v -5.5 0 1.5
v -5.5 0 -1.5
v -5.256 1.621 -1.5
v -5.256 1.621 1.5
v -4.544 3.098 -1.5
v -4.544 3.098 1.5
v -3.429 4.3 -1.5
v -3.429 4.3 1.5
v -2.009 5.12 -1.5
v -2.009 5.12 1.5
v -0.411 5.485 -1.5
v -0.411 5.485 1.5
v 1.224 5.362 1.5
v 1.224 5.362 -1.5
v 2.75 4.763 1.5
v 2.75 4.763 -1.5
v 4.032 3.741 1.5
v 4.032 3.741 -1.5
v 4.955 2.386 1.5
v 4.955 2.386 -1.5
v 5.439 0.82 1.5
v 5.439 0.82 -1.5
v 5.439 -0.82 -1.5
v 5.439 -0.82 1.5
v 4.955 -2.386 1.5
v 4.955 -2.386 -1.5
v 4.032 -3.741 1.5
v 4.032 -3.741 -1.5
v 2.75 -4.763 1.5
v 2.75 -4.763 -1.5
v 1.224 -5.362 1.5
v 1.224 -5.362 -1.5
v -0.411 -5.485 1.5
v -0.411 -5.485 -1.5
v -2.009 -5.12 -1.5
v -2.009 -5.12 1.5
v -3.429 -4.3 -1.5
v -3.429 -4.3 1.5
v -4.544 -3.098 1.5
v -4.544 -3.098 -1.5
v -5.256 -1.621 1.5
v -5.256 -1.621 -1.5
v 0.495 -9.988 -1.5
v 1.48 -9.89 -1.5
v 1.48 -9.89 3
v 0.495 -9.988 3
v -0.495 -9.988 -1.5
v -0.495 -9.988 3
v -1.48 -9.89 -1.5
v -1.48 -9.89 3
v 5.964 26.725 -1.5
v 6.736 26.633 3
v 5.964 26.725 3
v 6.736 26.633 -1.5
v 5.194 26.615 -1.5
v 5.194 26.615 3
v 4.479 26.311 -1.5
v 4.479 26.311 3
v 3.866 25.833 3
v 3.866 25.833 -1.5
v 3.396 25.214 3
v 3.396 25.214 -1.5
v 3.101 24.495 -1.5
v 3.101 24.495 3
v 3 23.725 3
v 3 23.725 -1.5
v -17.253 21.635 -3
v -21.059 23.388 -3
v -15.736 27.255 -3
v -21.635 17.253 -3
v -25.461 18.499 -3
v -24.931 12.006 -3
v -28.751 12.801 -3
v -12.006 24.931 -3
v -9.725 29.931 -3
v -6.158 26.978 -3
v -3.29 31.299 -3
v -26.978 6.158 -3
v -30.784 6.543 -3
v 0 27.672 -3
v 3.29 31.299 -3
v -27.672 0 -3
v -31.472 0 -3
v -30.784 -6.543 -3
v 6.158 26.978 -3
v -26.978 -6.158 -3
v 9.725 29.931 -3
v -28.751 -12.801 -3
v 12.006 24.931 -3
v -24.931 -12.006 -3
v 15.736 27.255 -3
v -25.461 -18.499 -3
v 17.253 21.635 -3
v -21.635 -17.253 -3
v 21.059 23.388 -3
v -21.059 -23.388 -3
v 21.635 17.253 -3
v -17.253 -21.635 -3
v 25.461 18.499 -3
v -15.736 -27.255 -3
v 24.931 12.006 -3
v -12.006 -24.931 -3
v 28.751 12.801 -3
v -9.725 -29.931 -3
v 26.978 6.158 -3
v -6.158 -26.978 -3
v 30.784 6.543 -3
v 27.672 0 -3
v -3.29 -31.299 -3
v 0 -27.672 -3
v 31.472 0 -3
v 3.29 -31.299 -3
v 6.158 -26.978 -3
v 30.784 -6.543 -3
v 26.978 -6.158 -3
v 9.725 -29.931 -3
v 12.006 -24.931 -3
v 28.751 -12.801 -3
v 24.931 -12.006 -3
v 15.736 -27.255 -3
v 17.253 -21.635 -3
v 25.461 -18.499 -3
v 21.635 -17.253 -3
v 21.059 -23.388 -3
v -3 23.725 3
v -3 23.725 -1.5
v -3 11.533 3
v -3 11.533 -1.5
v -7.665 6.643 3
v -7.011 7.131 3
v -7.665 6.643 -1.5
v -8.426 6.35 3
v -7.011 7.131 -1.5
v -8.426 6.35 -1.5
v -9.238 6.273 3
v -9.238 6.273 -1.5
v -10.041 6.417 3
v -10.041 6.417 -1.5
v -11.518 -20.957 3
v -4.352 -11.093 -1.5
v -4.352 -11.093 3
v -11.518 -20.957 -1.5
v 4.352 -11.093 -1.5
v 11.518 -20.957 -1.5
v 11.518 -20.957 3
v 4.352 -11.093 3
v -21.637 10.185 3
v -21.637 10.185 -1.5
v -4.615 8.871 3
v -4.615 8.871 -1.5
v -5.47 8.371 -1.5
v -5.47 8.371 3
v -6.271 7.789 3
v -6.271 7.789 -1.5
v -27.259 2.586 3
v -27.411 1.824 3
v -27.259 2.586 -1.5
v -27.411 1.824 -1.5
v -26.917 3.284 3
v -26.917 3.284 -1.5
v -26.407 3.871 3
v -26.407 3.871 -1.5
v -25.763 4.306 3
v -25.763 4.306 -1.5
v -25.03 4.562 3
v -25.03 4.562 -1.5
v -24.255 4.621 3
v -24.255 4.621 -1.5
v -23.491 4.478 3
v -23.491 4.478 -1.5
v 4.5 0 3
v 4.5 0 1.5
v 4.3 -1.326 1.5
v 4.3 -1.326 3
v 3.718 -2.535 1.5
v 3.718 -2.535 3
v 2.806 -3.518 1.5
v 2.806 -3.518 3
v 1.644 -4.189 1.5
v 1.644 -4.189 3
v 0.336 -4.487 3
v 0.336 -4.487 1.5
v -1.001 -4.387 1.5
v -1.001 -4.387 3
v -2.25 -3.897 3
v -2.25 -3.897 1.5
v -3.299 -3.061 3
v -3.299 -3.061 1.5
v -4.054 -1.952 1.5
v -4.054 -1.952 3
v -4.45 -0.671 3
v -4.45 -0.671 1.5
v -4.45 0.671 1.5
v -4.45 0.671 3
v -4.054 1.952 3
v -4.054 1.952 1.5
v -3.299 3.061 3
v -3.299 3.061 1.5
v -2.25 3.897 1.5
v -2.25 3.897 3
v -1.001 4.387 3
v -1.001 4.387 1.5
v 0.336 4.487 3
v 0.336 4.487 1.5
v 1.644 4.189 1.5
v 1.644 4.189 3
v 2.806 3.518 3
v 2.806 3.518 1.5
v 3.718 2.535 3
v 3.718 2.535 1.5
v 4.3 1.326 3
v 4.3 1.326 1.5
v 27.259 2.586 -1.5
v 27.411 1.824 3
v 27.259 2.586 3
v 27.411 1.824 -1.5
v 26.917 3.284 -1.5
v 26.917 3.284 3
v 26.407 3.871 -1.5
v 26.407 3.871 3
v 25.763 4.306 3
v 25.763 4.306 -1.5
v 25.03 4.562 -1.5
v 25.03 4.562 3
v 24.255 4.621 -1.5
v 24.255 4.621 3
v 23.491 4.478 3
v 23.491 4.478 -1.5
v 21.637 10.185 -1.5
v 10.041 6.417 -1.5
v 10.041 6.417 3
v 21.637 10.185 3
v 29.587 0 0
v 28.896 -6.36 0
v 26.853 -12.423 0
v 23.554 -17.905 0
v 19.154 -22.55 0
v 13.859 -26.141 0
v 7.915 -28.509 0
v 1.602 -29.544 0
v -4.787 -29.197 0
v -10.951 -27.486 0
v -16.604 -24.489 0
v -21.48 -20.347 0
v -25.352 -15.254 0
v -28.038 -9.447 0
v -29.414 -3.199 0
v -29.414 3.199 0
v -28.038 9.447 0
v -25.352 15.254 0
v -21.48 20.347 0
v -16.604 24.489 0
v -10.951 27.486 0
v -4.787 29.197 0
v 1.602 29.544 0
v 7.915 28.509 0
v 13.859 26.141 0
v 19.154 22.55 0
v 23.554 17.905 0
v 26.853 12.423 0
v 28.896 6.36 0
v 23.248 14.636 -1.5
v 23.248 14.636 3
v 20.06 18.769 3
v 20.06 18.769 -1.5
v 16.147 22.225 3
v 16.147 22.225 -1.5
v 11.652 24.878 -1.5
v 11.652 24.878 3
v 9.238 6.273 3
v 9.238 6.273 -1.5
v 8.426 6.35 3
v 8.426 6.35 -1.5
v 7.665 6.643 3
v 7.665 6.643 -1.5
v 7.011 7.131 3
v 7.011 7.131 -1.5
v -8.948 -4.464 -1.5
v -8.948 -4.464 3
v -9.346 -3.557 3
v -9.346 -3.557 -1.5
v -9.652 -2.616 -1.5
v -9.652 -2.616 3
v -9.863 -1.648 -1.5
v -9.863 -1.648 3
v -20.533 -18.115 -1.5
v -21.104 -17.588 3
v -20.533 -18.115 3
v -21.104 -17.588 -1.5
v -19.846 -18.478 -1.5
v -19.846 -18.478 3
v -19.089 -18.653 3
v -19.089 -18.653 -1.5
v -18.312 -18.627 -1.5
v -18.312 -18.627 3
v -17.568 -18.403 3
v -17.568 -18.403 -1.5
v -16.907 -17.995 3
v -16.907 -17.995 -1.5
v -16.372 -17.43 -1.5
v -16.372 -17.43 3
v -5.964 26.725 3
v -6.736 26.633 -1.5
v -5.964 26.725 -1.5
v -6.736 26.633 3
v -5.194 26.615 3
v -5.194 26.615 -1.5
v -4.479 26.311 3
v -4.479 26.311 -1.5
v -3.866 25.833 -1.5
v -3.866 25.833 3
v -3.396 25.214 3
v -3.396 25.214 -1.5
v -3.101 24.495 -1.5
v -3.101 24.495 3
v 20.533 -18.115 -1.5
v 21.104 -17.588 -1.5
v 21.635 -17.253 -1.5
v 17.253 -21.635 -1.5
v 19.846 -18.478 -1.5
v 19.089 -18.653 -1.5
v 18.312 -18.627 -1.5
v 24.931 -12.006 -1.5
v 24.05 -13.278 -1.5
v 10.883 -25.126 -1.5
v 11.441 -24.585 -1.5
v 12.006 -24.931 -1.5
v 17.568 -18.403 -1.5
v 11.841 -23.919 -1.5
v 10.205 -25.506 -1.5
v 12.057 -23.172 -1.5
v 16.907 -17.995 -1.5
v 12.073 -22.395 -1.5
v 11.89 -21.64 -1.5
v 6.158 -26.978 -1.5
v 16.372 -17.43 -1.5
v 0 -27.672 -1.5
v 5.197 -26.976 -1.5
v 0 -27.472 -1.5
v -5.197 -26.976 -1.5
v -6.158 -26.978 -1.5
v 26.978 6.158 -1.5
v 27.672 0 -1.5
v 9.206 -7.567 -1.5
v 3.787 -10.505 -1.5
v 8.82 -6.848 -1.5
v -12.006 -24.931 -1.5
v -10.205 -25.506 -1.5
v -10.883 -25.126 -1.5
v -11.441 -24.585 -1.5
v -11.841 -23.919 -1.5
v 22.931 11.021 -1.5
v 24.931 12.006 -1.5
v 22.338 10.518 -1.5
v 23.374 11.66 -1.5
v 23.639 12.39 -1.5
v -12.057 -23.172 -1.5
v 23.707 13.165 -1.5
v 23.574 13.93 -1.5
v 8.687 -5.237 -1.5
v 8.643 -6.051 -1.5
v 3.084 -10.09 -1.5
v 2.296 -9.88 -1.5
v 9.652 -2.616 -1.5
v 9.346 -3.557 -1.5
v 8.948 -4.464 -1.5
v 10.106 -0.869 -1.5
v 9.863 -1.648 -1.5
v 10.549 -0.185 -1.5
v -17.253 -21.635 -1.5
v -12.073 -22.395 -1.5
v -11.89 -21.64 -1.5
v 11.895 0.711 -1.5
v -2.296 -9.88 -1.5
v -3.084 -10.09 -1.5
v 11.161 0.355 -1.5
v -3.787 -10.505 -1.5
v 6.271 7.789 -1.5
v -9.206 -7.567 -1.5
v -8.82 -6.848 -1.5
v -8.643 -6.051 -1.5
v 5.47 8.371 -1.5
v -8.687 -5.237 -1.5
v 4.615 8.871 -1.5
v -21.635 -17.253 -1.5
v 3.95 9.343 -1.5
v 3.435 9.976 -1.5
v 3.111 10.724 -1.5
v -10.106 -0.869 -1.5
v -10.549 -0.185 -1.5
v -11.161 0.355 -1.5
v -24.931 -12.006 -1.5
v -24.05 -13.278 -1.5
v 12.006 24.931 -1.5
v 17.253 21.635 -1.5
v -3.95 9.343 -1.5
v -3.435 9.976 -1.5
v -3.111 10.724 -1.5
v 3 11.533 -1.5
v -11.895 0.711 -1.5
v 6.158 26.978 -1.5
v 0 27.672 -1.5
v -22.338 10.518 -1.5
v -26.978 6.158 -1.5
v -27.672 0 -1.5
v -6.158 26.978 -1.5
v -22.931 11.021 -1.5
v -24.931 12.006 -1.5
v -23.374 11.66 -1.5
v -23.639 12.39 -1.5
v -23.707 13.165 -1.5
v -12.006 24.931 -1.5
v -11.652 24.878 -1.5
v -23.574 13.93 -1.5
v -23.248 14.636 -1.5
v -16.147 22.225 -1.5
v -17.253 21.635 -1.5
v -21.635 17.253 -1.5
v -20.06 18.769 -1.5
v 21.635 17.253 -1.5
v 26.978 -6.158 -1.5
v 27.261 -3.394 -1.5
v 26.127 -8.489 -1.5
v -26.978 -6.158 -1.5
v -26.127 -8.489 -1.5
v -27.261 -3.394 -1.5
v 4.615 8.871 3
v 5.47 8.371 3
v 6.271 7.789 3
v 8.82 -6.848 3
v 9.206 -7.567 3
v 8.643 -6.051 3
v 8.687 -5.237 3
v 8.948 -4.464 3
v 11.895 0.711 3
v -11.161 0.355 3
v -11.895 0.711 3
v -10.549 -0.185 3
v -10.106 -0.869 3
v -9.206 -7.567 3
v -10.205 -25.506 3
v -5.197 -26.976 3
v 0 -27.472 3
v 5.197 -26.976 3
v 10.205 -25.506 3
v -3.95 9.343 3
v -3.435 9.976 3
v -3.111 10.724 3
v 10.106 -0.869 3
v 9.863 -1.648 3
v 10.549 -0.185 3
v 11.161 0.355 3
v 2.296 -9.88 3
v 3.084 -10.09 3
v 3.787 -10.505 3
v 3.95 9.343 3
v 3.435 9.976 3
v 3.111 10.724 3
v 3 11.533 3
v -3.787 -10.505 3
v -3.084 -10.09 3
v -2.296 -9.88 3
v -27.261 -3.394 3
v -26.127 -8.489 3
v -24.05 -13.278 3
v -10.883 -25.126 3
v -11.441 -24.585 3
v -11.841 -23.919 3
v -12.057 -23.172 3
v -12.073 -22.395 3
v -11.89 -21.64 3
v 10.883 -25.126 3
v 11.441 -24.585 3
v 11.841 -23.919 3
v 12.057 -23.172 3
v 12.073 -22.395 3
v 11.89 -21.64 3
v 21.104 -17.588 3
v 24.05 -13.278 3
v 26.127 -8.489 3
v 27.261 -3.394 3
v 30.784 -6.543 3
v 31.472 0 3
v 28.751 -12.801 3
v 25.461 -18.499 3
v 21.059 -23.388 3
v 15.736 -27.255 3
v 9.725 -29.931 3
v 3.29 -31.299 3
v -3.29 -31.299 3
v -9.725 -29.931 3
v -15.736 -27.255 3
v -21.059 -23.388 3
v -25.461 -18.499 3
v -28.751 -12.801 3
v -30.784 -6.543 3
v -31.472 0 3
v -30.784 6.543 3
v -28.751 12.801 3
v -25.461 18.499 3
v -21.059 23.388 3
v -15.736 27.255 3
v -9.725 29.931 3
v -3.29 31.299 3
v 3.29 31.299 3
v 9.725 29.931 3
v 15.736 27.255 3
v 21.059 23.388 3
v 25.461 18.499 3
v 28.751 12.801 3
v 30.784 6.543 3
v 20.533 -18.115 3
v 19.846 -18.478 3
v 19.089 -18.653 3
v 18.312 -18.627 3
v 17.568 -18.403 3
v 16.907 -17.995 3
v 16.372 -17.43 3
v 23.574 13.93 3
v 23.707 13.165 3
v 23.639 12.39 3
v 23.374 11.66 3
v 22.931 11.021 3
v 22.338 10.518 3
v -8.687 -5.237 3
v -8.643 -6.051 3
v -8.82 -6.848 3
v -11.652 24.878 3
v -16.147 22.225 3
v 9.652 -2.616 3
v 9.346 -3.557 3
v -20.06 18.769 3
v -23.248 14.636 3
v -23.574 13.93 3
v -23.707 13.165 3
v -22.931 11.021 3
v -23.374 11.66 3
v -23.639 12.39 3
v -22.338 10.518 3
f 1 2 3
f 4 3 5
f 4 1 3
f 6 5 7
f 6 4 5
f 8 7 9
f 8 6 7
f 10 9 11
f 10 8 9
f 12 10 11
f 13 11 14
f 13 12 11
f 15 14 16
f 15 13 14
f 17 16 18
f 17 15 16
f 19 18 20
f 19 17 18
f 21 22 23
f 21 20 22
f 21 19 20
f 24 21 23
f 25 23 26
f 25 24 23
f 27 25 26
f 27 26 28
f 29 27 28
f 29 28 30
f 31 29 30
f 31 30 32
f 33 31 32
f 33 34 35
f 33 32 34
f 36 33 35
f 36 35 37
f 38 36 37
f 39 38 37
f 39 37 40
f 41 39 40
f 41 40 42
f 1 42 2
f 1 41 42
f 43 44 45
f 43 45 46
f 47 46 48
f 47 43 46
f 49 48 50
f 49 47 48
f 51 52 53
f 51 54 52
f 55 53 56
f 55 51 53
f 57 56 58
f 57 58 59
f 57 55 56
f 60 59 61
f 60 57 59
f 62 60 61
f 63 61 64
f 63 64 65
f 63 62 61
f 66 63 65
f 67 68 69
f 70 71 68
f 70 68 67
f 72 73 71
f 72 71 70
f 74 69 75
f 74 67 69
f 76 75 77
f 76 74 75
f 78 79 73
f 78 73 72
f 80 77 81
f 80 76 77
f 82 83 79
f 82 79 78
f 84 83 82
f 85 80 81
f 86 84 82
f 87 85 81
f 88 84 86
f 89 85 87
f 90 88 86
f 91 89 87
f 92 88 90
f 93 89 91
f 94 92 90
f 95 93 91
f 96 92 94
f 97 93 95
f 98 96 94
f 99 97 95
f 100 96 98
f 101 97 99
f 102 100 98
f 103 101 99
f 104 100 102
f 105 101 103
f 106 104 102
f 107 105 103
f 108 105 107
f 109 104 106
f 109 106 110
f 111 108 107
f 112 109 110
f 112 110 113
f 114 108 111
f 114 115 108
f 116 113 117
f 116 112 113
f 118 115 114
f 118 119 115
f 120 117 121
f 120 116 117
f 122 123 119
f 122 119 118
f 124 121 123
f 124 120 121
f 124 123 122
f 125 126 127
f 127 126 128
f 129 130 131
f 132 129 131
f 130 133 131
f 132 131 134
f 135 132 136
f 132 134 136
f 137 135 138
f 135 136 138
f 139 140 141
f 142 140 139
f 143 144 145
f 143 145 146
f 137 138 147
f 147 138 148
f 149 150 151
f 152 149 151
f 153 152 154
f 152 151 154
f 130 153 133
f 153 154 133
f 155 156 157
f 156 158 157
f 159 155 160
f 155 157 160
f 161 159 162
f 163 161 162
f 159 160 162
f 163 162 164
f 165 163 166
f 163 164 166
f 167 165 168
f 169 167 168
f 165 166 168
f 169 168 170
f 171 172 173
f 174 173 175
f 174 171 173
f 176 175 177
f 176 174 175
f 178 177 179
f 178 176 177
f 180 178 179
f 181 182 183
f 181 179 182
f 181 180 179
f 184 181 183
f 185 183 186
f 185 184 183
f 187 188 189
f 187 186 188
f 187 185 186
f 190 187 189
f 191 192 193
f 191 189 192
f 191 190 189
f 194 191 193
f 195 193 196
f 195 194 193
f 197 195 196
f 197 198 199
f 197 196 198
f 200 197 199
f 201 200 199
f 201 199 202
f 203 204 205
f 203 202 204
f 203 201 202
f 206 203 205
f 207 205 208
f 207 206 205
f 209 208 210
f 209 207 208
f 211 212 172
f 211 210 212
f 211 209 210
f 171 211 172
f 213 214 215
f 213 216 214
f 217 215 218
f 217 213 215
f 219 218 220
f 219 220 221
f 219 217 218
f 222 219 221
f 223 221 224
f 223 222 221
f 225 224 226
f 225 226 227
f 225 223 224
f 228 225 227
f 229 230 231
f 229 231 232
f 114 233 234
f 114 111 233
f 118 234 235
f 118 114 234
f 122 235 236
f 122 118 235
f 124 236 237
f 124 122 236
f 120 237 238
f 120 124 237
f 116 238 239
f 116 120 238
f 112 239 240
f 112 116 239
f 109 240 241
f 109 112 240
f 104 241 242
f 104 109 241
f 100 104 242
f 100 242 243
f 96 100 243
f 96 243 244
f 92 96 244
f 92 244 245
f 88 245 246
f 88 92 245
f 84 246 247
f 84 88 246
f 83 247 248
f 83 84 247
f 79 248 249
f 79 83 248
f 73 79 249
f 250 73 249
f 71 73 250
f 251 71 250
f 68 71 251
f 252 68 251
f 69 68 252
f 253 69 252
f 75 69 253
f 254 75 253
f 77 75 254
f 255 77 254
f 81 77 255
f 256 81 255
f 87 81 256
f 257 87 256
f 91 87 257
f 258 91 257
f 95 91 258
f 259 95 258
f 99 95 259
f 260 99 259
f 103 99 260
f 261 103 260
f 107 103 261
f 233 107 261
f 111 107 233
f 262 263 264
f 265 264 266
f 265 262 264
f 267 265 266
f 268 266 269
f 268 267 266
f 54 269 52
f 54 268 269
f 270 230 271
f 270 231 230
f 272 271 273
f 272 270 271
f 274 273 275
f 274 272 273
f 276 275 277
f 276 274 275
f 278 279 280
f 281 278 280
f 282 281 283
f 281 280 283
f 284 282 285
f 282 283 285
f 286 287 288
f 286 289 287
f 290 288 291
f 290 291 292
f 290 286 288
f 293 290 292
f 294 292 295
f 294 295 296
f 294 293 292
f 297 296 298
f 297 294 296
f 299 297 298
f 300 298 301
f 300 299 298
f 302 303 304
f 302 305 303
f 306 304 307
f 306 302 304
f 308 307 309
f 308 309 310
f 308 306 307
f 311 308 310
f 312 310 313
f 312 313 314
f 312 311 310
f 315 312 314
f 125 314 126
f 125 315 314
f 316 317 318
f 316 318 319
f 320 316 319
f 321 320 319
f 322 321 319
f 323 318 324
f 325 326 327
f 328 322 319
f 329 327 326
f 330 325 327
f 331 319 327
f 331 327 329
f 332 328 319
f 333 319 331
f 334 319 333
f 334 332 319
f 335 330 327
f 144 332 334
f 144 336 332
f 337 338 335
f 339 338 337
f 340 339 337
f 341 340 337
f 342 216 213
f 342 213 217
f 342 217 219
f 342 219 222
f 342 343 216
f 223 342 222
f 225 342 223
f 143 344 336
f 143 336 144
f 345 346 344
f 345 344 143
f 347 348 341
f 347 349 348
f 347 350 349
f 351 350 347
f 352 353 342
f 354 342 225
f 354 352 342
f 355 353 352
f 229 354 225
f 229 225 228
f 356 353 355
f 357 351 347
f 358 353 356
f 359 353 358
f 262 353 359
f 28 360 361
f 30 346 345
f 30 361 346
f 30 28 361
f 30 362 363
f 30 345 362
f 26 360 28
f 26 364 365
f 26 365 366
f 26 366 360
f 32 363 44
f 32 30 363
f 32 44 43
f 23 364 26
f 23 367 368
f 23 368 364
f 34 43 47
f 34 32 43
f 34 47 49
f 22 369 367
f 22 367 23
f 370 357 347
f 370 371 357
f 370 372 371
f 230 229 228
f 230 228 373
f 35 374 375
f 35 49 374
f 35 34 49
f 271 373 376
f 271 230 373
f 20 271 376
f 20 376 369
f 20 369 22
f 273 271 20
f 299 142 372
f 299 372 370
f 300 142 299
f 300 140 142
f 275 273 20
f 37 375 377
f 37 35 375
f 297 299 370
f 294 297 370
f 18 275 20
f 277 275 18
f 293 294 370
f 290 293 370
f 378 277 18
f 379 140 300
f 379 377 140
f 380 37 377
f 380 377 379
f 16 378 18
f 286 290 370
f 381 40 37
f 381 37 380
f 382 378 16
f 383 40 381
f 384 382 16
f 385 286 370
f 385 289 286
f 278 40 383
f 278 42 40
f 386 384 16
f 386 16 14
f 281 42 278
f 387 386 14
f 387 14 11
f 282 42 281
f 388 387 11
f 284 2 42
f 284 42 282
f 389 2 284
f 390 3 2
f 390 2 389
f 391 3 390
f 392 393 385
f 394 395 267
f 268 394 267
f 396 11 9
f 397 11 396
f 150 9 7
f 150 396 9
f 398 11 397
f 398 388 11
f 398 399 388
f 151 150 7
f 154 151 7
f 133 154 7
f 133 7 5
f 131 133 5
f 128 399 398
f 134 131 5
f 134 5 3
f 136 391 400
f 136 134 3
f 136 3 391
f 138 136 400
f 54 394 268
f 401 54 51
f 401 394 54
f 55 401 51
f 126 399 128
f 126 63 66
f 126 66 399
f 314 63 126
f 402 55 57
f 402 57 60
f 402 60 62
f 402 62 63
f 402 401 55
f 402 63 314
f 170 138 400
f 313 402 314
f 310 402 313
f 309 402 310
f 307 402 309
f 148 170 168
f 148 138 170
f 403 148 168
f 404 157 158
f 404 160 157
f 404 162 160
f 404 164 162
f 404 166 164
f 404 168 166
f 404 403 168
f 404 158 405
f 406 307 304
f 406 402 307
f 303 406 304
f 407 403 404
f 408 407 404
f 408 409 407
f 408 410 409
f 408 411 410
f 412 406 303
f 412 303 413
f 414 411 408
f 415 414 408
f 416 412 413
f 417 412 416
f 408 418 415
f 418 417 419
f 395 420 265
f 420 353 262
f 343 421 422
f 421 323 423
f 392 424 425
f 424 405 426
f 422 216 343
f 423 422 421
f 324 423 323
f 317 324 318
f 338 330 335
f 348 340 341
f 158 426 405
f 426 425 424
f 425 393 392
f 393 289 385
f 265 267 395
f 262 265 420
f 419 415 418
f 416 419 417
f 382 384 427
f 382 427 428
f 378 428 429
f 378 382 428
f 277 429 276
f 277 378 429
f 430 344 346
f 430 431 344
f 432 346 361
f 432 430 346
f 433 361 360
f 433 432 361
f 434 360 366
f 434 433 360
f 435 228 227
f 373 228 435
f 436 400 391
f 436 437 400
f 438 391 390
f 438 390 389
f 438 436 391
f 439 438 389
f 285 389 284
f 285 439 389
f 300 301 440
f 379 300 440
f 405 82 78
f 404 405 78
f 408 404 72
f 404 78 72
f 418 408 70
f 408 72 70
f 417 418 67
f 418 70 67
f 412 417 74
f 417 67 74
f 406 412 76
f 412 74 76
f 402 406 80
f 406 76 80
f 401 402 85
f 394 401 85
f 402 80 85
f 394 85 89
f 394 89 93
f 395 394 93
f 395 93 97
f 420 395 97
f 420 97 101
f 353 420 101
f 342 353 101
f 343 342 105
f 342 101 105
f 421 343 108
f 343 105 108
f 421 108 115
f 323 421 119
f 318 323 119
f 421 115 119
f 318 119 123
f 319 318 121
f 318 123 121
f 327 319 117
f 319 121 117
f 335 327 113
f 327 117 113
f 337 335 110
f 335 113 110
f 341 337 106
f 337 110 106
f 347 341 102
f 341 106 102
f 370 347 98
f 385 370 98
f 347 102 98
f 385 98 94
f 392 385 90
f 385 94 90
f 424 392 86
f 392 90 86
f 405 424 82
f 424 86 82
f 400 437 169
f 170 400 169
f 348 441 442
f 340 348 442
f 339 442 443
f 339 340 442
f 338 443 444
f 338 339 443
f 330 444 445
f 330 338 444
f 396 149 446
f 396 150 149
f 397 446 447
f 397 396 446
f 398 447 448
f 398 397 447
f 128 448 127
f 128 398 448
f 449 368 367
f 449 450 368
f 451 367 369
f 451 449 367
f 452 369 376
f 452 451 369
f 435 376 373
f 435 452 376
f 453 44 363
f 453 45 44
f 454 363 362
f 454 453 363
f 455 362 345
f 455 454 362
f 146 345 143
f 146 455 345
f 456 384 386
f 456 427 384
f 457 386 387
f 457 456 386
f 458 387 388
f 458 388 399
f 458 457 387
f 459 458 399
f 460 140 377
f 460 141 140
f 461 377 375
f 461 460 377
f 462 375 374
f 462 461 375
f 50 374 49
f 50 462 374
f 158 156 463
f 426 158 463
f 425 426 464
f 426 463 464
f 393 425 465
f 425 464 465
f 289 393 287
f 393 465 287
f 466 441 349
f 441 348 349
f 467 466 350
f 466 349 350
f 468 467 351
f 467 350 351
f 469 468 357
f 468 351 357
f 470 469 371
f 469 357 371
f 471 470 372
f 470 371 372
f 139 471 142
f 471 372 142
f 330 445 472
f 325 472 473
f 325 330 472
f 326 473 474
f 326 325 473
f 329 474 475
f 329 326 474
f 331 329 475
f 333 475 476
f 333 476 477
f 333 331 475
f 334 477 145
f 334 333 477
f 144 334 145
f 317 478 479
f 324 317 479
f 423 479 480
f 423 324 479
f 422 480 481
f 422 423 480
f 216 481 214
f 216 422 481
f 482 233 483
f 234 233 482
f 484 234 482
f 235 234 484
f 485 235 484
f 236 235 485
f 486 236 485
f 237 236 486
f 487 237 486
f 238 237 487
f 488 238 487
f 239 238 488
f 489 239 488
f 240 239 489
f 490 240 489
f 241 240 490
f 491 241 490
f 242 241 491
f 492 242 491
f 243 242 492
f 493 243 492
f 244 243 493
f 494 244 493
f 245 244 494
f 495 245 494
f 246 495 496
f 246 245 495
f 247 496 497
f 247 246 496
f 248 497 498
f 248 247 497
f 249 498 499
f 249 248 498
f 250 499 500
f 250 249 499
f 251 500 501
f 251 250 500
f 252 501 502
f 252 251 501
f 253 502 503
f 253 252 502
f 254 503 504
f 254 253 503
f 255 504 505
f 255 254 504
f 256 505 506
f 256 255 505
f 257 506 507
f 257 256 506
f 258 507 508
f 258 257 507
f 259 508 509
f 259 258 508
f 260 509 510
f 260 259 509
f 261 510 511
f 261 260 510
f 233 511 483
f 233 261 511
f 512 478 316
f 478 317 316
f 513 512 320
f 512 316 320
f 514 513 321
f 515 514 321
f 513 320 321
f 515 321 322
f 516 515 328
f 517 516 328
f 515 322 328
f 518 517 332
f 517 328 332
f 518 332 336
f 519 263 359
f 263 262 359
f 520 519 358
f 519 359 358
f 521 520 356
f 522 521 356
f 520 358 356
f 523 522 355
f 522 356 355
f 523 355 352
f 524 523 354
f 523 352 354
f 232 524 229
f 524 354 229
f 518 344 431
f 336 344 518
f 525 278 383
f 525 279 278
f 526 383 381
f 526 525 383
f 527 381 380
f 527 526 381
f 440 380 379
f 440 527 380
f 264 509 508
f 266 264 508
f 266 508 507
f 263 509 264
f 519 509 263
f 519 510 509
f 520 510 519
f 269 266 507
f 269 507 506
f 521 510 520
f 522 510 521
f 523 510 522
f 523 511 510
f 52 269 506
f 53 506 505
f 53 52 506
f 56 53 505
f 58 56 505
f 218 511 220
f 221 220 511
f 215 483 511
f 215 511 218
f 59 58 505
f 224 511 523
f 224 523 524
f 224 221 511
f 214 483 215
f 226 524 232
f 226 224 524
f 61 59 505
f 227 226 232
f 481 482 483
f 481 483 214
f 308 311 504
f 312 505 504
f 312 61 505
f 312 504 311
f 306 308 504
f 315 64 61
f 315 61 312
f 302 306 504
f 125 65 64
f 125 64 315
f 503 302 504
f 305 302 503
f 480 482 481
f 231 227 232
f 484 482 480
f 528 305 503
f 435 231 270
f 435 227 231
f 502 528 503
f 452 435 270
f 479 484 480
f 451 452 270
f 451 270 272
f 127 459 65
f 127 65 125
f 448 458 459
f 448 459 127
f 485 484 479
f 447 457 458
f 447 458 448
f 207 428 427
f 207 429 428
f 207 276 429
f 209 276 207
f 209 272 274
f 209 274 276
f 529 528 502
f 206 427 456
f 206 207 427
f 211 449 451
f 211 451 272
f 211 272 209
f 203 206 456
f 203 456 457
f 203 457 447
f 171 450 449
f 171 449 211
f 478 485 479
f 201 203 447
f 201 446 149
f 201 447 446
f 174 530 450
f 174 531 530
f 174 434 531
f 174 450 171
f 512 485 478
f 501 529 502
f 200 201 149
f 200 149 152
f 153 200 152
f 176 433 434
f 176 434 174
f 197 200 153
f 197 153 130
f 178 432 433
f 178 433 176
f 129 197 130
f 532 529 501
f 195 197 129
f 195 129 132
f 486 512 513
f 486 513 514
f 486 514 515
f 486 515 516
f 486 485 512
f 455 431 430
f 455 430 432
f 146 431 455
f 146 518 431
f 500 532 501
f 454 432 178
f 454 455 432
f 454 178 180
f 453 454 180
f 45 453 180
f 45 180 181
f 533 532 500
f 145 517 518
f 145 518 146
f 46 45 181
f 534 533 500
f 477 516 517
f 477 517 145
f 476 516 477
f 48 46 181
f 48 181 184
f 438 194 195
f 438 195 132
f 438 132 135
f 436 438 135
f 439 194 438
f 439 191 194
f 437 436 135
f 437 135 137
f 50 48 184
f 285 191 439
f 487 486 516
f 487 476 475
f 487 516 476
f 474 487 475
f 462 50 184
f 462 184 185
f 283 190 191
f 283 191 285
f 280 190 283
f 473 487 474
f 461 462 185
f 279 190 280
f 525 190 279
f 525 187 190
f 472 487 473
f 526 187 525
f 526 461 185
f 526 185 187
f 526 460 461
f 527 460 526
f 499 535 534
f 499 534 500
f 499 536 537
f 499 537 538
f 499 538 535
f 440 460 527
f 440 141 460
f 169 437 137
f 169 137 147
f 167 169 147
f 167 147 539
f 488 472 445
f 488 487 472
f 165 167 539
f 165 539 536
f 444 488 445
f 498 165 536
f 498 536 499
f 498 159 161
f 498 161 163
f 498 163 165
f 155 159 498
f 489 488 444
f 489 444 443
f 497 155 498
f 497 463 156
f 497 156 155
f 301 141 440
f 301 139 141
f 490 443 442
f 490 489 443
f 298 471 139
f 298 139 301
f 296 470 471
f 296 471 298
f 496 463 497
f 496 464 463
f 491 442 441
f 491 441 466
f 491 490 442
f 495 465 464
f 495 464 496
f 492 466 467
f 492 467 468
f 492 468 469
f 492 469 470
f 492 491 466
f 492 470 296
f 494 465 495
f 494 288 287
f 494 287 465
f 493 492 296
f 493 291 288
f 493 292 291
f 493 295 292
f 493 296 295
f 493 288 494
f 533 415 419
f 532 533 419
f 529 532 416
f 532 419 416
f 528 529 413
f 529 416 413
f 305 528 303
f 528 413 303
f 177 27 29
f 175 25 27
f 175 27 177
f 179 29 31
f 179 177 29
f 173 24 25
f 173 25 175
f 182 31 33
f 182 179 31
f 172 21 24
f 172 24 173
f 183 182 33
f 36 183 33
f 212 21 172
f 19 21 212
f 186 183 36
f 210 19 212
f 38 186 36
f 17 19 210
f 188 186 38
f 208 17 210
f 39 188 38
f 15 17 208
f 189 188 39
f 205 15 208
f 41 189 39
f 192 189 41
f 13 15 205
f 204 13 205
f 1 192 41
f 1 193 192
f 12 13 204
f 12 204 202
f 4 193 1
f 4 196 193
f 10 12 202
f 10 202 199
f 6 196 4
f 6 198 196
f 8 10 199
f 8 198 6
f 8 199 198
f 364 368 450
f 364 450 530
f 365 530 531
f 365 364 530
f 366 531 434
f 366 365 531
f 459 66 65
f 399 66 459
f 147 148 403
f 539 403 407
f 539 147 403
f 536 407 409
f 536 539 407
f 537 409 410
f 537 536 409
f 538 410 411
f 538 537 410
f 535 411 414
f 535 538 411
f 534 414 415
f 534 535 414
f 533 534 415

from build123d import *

# Parameters (mm, degrees)
CUT_EXTRUDE1_DEPTH      = 5
SKETCH3_R               = 27.671687605
CUT_EXTRUDE2_DEPTH      = 1.5
FILLET1_R               = 3
CUT_EXTRUDE3_DEPTH      = 11
CUT_EXTRUDE3_DEPTH_BACK = 1.5
SKETCH4_R               = 5.5


with BuildPart() as part:
    # Sketch1 → Revolve1 (revolve)
    with BuildSketch(Plane(origin=(0, 0, 0), x_dir=(0, 0, -1), z_dir=(1, 0, 0)), mode=Mode.PRIVATE) as revolve1_sk:
        Polygon((3, 31.471687605), (3, 4.5), (-3, 4.5), (-3, 31.471687605), (0, 29.587241701), align=None)
    revolve(revolve1_sk.sketch.rotate(Axis((0, 0, 0), (0, 0, -1)), 90), axis=Axis((0, 0, 0), (0, 0, -1)))

    # Sketch2 → Cut-Extrude1 (cut, symmetric)
    with BuildSketch(Plane.XY):
        with BuildLine():
            Line((-3, 27.307391304), (-3, 9.539392014))
            ThreePointArc((-3, 9.539392014), (-5.877852523, 8.090169944), (-8.145449953, 5.801003797))
            Line((-8.145449953, 5.801003797), (-25.04382146, 11.291617534))
            ThreePointArc((-25.04382146, 11.291617534), (-16.14745283, 22.225062136), (-3, 27.307391304))
        make_face()
        with BuildLine():
            Line((3, 27.307391304), (3, 9.539392014))
            ThreePointArc((3, 9.539392014), (5.877852523, 8.090169944), (8.145449953, 5.801003797))
            Line((8.145449953, 5.801003797), (25.04382146, 11.291617534))
            ThreePointArc((25.04382146, 11.291617534), (16.14745283, 22.225062136), (3, 27.307391304))
        make_face()
        with BuildLine():
            Line((26.897923426, 5.585278436), (9.99955192, 0.094664699))
            ThreePointArc((9.99955192, 0.094664699), (9.510565163, -3.090169944), (8.034164925, -5.954174499))
            Line((8.034164925, -5.954174499), (18.47793287, -20.328787881))
            ThreePointArc((18.47793287, -20.328787881), (26.12712751, -8.489218334), (26.897923426, 5.585278436))
        make_face()
        with BuildLine():
            Line((13.623830904, -23.855499394), (3.180062959, -9.480886012))
            ThreePointArc((3.180062959, -9.480886012), (0, -10), (-3.180062959, -9.480886012))
            Line((-3.180062959, -9.480886012), (-13.623830904, -23.855499394))
            ThreePointArc((-13.623830904, -23.855499394), (0, -27.471687605), (13.623830904, -23.855499394))
        make_face()
        with BuildLine():
            Line((-18.47793287, -20.328787881), (-8.034164925, -5.954174499))
            ThreePointArc((-8.034164925, -5.954174499), (-9.510565163, -3.090169944), (-9.99955192, 0.094664699))
            Line((-9.99955192, 0.094664699), (-26.897923426, 5.585278436))
            ThreePointArc((-26.897923426, 5.585278436), (-26.12712751, -8.489218334), (-18.47793287, -20.328787881))
        make_face()
    extrude(amount=CUT_EXTRUDE1_DEPTH, both=True, mode=Mode.SUBTRACT)

    # Sketch3 → Cut-Extrude2 (cut)
    with BuildSketch(Plane(origin=(0, 0, -3), x_dir=(-1, 0, 0), z_dir=(0, 0, -1))):
        Circle(SKETCH3_R)
    extrude(amount=-CUT_EXTRUDE2_DEPTH, mode=Mode.SUBTRACT)

    # Fillet1
    fillet1_edges = [part.edges().sort_by_distance(p)[0] for p in [
        (-8.034164925, -5.954174499, 0.75),
        (-18.47793287, -20.328787881, 0.75),
        (-9.99955192, 0.094664699, 0.75),
        (-26.897923426, 5.585278436, 0.75),
        (3.180062959, -9.480886012, 0.75),
        (13.623830904, -23.855499394, 0.75),
        (-3.180062959, -9.480886012, 0.75),
        (-13.623830904, -23.855499394, 0.75),
        (9.99955192, 0.094664699, 0.75),
        (26.897923426, 5.585278436, 0.75),
        (8.034164925, -5.954174499, 0.75),
        (18.47793287, -20.328787881, 0.75),
        (3, 9.539392014, 0.75),
        (3, 27.307391304, 0.75),
        (8.145449953, 5.801003797, 0.75),
        (25.04382146, 11.291617534, 0.75),
        (-8.145449953, 5.801003797, 0.75),
        (-25.04382146, 11.291617534, 0.75),
        (-3, 9.539392014, 0.75),
        (-3, 27.307391304, 0.75),
    ]]
    fillet(fillet1_edges, radius=FILLET1_R)

    # Sketch4 → Cut-Extrude3 (cut, two sides: drawn at the far end of the back side and taken through both)
    with BuildSketch(Plane(origin=(0, 0, 0), x_dir=(-1, 0, 0), z_dir=(0, 0, -1)).offset(-CUT_EXTRUDE3_DEPTH_BACK)):
        Circle(SKETCH4_R)
    extrude(amount=CUT_EXTRUDE3_DEPTH + CUT_EXTRUDE3_DEPTH_BACK, mode=Mode.SUBTRACT)


solid = part.part
